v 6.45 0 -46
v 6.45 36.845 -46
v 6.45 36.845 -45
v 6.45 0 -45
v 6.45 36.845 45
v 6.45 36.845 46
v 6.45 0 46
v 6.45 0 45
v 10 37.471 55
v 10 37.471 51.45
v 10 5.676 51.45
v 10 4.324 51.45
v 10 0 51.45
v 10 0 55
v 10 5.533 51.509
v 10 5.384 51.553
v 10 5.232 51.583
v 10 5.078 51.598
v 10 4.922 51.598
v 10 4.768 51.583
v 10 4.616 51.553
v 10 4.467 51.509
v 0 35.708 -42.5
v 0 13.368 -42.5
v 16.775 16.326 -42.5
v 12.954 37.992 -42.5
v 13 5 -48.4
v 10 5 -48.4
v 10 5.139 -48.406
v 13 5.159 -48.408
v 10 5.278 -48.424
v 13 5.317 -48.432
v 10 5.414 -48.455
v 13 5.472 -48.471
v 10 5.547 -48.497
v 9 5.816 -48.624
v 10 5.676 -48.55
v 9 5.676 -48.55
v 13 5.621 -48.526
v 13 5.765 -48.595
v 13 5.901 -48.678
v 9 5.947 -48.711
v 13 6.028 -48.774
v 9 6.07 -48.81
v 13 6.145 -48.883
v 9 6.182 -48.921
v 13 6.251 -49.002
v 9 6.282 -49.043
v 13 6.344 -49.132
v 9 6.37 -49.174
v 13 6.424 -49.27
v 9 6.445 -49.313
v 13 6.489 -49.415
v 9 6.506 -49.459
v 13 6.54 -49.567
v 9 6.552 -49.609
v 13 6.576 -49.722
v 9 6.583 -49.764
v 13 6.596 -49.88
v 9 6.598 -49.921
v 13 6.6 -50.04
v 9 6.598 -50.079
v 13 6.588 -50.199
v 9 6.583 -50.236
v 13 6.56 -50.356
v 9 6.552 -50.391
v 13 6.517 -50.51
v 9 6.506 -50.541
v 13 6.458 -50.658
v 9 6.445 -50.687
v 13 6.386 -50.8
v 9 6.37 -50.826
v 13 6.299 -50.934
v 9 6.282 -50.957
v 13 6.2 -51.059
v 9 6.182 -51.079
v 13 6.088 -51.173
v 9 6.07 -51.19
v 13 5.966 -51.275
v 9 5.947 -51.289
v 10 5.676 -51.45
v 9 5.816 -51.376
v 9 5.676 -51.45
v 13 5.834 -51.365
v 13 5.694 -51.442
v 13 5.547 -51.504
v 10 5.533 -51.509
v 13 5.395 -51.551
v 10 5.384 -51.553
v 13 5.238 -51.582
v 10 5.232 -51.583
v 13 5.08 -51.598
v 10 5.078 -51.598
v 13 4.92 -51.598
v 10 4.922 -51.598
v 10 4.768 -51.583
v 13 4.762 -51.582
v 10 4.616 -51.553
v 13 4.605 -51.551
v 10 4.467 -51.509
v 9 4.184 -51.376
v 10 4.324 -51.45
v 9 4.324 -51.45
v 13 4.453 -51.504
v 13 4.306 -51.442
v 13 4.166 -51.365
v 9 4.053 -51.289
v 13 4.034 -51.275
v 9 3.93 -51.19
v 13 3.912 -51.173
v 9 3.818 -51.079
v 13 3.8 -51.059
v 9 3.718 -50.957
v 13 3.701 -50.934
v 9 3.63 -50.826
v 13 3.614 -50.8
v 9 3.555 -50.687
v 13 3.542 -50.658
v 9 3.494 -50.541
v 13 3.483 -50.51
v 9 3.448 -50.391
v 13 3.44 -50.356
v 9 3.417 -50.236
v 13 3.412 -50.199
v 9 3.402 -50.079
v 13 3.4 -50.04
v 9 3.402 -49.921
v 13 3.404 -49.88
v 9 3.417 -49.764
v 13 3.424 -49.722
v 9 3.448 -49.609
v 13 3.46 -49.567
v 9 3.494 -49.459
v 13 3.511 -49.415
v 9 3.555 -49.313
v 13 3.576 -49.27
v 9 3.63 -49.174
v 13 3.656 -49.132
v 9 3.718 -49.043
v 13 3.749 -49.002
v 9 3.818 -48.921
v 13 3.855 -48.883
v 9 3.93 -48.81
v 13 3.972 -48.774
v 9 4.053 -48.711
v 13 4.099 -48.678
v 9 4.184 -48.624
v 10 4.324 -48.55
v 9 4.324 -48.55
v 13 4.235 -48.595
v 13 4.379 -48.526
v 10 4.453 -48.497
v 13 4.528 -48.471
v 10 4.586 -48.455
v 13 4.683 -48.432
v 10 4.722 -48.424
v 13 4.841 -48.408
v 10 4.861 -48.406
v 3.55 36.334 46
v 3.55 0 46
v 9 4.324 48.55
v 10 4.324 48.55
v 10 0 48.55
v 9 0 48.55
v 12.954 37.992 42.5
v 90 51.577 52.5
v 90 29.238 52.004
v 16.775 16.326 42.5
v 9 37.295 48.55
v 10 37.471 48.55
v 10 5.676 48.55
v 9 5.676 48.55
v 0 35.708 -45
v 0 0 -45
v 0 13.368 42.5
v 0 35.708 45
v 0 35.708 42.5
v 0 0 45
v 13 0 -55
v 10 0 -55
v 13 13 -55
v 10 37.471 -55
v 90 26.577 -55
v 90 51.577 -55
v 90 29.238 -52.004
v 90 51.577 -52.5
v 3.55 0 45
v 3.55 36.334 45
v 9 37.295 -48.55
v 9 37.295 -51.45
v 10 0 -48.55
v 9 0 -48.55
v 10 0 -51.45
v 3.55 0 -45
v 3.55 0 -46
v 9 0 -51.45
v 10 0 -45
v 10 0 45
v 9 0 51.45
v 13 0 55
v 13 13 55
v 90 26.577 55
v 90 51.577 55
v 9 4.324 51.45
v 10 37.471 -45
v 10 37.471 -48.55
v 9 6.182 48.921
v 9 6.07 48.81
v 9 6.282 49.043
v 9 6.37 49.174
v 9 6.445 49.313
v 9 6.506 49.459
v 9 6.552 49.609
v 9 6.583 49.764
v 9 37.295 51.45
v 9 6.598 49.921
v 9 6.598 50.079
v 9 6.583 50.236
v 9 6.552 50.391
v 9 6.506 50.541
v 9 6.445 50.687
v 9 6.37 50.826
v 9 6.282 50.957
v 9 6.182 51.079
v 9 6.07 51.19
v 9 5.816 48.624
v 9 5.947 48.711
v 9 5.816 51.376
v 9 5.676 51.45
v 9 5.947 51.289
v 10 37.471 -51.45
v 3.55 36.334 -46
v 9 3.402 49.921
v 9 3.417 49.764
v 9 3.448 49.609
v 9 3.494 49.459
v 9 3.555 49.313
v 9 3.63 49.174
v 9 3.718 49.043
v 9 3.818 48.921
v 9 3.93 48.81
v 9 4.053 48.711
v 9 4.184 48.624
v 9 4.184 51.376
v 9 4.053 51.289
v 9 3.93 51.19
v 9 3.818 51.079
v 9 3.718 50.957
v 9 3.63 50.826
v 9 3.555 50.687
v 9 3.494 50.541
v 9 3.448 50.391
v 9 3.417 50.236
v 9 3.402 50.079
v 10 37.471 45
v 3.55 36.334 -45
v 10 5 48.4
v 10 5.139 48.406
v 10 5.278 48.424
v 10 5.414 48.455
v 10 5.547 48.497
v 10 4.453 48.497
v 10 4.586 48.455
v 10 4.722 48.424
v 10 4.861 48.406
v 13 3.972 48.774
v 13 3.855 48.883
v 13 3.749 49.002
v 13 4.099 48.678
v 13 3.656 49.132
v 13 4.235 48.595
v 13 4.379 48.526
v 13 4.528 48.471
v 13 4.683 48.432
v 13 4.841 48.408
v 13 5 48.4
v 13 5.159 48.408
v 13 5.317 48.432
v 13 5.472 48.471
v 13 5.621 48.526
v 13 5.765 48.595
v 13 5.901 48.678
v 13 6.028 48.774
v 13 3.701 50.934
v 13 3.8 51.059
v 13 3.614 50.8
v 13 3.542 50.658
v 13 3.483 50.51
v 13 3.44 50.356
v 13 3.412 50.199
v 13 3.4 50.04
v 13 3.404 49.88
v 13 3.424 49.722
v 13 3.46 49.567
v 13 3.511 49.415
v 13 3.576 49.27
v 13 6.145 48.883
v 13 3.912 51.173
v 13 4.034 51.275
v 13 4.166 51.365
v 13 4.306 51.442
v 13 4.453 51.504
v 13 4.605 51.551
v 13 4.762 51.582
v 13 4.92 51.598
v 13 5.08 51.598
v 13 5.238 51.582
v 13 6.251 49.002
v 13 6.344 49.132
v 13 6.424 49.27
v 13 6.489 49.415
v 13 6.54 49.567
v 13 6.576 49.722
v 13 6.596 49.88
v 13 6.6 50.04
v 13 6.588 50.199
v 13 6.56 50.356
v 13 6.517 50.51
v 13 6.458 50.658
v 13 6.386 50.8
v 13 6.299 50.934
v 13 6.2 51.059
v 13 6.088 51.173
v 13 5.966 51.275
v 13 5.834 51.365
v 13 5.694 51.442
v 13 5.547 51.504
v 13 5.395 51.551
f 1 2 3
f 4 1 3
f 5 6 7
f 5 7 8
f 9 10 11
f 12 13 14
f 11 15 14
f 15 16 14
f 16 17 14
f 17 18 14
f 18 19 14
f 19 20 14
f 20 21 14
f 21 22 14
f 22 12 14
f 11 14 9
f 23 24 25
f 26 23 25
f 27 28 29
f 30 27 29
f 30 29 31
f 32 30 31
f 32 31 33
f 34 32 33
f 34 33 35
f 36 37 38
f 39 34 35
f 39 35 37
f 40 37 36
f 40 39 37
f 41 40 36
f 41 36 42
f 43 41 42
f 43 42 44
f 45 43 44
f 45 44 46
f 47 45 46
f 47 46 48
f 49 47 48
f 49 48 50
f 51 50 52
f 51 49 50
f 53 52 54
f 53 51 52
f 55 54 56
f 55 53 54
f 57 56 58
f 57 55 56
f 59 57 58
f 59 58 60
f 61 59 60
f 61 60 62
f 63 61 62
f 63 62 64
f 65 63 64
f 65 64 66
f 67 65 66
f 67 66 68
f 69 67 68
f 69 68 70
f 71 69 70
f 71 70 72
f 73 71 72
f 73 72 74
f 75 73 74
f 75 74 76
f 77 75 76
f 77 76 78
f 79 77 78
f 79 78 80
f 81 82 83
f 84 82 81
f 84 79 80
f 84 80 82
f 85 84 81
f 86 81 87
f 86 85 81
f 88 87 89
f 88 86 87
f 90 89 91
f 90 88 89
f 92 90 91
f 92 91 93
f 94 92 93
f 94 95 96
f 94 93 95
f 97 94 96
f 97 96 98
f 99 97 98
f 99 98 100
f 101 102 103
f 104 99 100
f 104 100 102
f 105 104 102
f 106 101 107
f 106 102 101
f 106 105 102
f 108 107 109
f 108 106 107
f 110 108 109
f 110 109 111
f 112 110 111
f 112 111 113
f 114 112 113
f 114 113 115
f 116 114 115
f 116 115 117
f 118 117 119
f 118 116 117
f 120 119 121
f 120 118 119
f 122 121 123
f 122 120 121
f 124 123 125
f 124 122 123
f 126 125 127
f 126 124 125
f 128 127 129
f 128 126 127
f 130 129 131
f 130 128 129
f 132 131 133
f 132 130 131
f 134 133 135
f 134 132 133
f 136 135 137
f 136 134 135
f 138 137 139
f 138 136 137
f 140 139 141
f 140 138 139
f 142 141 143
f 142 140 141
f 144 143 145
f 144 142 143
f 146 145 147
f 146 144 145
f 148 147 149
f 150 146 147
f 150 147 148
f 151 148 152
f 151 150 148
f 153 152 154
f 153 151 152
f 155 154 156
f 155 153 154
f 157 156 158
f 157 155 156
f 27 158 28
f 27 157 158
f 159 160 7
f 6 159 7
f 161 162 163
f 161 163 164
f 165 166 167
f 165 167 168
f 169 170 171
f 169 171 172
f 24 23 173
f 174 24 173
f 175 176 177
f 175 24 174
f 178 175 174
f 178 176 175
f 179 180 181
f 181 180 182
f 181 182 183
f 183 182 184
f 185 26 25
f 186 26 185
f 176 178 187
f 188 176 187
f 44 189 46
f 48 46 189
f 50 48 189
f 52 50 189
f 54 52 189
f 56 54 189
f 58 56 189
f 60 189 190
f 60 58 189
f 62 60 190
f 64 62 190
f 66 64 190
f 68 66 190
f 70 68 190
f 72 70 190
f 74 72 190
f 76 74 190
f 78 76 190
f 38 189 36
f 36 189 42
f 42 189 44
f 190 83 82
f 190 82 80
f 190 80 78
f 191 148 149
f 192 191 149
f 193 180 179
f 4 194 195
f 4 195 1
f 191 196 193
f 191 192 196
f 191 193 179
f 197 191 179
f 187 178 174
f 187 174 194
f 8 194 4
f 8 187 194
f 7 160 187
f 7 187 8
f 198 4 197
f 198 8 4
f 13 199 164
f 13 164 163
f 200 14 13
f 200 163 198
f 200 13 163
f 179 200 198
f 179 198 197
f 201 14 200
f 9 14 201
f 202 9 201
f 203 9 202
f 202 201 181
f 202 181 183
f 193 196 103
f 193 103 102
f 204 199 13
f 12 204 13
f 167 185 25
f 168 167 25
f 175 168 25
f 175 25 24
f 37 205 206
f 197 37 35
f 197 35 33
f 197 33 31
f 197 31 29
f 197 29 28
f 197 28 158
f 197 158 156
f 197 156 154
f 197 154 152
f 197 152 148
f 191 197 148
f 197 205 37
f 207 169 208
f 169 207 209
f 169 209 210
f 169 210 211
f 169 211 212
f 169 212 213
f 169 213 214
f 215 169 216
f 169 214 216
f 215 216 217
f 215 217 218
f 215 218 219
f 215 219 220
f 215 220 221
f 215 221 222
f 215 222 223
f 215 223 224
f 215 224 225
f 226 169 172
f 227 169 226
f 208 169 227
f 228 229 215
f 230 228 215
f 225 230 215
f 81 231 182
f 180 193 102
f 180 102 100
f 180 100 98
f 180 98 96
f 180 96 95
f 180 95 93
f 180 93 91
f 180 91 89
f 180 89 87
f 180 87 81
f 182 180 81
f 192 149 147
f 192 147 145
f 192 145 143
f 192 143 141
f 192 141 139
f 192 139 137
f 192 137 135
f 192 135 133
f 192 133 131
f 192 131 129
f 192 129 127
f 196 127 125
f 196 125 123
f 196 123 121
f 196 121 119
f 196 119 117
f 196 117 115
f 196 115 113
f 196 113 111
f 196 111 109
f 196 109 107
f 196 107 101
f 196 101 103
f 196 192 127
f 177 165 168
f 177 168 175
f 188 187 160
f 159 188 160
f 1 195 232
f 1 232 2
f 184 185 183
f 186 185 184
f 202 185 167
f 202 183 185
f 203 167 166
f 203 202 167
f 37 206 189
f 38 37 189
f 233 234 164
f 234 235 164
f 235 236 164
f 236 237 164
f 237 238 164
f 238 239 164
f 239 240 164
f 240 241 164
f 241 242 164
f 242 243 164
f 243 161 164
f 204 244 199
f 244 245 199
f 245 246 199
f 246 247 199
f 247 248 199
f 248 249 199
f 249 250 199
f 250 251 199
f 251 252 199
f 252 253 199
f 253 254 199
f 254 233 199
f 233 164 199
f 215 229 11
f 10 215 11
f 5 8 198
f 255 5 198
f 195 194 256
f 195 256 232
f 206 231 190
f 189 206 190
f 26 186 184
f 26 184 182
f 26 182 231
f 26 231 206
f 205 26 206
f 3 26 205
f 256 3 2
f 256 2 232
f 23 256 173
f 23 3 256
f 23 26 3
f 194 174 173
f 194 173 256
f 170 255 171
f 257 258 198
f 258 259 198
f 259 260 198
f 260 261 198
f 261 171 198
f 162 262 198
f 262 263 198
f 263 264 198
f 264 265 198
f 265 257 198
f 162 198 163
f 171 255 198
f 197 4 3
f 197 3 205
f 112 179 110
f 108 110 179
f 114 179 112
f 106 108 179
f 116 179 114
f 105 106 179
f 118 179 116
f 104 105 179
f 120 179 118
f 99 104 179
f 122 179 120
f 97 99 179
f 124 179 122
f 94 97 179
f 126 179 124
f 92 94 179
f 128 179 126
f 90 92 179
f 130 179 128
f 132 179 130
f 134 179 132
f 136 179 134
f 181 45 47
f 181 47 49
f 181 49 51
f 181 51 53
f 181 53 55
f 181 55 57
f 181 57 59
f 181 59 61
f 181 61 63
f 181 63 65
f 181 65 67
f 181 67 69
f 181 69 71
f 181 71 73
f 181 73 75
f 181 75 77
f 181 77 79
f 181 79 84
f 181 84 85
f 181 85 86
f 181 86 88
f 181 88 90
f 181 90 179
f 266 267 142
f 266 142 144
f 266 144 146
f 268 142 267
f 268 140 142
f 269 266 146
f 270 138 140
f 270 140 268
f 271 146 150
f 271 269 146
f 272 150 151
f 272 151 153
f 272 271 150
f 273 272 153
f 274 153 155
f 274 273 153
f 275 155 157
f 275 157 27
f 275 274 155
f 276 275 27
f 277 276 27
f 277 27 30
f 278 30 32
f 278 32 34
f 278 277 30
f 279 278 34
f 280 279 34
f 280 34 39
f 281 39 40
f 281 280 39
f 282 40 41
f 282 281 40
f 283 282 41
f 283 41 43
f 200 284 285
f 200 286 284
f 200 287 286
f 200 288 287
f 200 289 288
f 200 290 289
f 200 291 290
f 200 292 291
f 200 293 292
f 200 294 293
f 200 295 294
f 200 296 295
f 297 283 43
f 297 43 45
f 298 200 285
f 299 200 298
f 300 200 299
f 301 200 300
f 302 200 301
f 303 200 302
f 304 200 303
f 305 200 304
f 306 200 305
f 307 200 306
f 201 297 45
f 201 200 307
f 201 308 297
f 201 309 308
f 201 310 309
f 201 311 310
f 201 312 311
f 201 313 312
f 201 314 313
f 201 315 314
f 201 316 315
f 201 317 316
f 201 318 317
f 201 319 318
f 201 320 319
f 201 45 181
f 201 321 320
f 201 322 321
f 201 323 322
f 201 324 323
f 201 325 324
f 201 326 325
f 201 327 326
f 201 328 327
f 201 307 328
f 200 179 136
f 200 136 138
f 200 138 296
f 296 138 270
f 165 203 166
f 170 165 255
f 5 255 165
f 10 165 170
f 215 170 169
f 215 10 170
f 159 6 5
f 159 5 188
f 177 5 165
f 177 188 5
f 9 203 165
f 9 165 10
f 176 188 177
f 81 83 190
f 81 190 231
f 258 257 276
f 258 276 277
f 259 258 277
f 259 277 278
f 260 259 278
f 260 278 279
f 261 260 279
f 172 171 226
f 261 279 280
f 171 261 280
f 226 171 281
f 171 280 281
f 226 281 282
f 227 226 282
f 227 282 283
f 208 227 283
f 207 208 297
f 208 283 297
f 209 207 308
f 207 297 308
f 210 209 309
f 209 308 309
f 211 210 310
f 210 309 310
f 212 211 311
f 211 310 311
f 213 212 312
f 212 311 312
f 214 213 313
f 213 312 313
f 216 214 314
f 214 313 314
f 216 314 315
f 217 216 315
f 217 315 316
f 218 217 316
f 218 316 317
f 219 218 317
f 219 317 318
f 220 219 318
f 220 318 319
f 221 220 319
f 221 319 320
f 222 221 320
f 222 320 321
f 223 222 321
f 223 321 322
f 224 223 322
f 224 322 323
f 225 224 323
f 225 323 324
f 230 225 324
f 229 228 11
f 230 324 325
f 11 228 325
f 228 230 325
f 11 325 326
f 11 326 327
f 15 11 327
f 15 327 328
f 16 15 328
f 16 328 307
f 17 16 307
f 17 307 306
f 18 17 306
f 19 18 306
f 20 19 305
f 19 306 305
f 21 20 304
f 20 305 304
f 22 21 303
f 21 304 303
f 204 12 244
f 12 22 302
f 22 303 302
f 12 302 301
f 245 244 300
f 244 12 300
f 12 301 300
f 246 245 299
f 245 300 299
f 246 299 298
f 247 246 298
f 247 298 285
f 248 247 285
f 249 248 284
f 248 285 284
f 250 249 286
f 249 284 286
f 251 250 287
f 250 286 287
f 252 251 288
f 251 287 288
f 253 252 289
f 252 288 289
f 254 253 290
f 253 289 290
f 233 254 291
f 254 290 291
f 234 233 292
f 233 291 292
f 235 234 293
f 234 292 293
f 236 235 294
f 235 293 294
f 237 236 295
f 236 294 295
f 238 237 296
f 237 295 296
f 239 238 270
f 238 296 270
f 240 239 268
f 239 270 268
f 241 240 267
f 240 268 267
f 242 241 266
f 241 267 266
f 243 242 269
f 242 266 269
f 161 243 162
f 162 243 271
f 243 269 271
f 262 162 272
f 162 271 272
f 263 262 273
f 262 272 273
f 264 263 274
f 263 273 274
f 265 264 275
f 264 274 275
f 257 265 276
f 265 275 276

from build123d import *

# Parameters (mm, degrees)
MAIN_DEPTH              = 55
FIXING_DEPTH            = 52.577177515
ESQUISSE4_R             = 1.6
ENL_V_MAT_EXTRU_6_DEPTH = 14
CENTRAL_HOLE_DEPTH      = 22


with BuildPart() as part:
    # Esquisse1 → Main (new body, symmetric)
    with BuildSketch(Plane.XY):
        Polygon((0, 0), (13, 0), (13, 13), (90, 26.577177515), (90, 51.577177515), (0, 35.707749251), align=None)
    extrude(amount=MAIN_DEPTH, both=True)

    # Esquisse3 → Fixing (cut, through all)
    with BuildSketch(Plane(origin=(-3.294458096, 0, 0), x_dir=(1, 0, 0), z_dir=(0, 1, 0))):
        Polygon((3.294458096, 45), (6.844458096, 45), (6.844458096, 46), (9.744458096, 46), (9.744458096, 45), (13.294458096, 45), (13.294458096, 48.55), (12.294458096, 48.55), (12.294458096, 51.45), (13.294458096, 51.45), (13.294458096, 55), (3.294458096, 55), align=None)
    fixing = extrude(amount=FIXING_DEPTH, mode=Mode.SUBTRACT)

    # Esquisse4 → Enlèv. mat.-Extru.6 (cut, through all)
    with BuildSketch(Plane(origin=(13, 0, 0), x_dir=(0, 0, -1), z_dir=(1, 0, 0))):
        with Locations((-50, 5)):
            Circle(ESQUISSE4_R)
    enl_v_mat_extru_6 = extrude(amount=-ENL_V_MAT_EXTRU_6_DEPTH, mode=Mode.SUBTRACT)

    # Symétrie1: Fixing, Enlèv. mat.-Extru.6 across plane
    add(fixing.mirror(Plane.XY), mode=Mode.SUBTRACT)
    add(enl_v_mat_extru_6.mirror(Plane.XY), mode=Mode.SUBTRACT)

    # Esquisse2 → Central Hole (cut)
    with BuildSketch(Plane(origin=(-6.106384758, 34.631028863, 0), x_dir=(0.984807753, 0.173648178, 0), z_dir=(-0.173648178, 0.984807753, 0))):
        Polygon((97.588980656, 52.5), (97.588980656, -52.5), (19.354851705, -42.5), (-3.799414414, -42.5), (-3.799414414, 42.5), (19.354851705, 42.5), align=None)
    extrude(amount=-CENTRAL_HOLE_DEPTH, mode=Mode.SUBTRACT)


solid = part.part
